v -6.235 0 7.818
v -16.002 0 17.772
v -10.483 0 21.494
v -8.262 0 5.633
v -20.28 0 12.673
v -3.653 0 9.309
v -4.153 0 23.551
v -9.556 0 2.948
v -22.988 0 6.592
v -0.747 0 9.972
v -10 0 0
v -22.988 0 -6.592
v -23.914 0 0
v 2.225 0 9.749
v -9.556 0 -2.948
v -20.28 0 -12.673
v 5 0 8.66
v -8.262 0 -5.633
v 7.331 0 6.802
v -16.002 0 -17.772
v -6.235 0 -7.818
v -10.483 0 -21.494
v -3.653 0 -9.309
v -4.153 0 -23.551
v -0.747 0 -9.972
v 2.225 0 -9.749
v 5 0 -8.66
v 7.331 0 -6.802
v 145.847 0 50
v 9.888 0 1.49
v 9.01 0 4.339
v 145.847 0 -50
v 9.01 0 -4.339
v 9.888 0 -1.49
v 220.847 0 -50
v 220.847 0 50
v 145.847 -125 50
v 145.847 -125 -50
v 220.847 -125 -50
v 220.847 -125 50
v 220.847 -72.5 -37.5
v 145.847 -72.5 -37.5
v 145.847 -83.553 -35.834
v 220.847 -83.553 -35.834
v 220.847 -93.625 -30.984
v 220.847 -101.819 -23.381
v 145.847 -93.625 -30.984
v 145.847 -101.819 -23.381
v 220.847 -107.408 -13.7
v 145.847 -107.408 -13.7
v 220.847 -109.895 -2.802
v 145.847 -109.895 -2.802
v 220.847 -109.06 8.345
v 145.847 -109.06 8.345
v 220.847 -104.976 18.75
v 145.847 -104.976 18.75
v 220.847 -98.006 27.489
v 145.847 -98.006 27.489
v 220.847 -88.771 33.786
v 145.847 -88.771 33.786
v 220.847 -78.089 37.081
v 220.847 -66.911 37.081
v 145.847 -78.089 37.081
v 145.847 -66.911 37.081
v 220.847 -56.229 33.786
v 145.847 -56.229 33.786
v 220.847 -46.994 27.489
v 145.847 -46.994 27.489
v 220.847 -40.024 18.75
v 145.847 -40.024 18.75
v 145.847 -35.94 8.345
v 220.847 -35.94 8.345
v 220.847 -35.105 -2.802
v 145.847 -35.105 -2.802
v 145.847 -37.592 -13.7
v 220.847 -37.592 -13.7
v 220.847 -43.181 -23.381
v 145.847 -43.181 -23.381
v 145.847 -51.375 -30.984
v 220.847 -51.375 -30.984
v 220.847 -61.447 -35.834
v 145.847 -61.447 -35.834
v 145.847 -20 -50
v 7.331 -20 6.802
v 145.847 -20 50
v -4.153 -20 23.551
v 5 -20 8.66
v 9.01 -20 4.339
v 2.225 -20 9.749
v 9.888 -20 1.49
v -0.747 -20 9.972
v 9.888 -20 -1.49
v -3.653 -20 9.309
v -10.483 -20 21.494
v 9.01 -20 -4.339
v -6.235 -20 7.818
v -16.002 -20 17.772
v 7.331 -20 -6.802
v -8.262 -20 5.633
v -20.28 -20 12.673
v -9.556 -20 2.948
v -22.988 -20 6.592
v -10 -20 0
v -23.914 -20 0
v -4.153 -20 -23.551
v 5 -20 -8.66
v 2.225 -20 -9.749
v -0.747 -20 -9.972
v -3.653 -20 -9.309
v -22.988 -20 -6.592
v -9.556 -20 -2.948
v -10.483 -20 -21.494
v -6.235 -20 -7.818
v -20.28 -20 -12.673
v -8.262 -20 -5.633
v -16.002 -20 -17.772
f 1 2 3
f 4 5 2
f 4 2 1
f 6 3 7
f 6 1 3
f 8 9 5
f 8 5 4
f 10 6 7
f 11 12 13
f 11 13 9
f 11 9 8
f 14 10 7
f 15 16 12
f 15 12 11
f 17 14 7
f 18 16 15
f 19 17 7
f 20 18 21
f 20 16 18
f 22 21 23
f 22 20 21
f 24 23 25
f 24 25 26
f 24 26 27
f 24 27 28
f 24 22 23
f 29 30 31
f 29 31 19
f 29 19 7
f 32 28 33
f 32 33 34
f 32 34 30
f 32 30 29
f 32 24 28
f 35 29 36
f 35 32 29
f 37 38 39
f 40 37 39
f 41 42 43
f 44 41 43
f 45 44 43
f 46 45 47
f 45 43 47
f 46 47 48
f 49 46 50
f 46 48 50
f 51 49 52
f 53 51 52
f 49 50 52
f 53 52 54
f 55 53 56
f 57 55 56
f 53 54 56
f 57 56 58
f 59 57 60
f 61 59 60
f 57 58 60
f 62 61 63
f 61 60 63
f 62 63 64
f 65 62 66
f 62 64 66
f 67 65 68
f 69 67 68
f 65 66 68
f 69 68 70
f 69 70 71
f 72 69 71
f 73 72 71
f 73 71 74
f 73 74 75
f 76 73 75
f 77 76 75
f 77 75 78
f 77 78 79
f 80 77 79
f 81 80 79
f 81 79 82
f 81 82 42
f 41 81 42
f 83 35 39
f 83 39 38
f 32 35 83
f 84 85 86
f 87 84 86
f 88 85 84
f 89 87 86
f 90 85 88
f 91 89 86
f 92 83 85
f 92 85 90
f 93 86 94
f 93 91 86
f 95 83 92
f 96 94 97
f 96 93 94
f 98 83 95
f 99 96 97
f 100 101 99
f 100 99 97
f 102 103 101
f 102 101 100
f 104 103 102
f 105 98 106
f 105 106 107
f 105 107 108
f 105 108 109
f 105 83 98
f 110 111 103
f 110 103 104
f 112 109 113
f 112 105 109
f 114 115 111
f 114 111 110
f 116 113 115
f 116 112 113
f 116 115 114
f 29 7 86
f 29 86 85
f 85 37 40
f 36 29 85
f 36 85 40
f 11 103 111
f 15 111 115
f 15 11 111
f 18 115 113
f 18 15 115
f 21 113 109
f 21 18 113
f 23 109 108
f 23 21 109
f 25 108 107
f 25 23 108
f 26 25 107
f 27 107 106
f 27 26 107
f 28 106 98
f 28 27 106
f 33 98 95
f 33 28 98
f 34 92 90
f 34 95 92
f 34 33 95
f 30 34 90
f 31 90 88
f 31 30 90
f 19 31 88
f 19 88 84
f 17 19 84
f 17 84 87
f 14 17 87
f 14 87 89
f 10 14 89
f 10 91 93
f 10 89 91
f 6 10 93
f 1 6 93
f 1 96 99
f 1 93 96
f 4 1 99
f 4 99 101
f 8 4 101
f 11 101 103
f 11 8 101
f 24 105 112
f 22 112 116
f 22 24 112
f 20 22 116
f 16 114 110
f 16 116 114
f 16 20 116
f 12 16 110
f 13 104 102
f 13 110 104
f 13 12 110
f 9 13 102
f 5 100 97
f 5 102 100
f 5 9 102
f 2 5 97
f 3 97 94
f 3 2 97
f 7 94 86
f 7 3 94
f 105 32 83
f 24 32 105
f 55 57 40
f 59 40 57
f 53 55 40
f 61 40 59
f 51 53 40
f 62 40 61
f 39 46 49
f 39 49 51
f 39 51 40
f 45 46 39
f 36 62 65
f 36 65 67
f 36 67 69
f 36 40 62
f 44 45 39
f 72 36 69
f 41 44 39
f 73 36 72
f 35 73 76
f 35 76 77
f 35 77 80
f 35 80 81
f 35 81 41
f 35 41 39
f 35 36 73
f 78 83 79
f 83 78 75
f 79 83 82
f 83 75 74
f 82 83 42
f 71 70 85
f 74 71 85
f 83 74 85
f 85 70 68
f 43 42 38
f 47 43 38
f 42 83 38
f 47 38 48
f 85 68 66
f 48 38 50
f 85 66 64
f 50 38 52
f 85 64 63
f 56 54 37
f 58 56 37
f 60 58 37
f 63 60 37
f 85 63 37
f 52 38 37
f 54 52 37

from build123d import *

# Parameters (mm, degrees)
SKETCH1_R           = 10
BOSS_EXTRUDE1_DEPTH = 125
CUT_EXTRUDE1_DEPTH  = 105
SKETCH5_R           = 37.5
CUT_EXTRUDE2_DEPTH  = 76


with BuildPart() as part:
    # Sketch1 → Boss-Extrude1 (new body)
    with BuildSketch(Plane(origin=(0, 0, 0), x_dir=(-1, 0, 0), z_dir=(0, -1, 0))):
        with BuildLine():
            Line((-220.847331583, 50), (-145.847331583, 50))
            Line((-145.847331583, 50), (4.152668417, 23.550952894))
            ThreePointArc((4.152668417, 23.550952894), (23.914264304, 0), (4.152668417, -23.550952894))
            Line((4.152668417, -23.550952894), (-145.847331583, -50))
            Line((-145.847331583, -50), (-220.847331583, -50))
            Line((-220.847331583, -50), (-220.847331583, 50))
        make_face()
        Circle(SKETCH1_R, mode=Mode.SUBTRACT)
    extrude(amount=BOSS_EXTRUDE1_DEPTH)

    # Sketch2 → Cut-Extrude1 (cut)
    with BuildSketch(Plane(origin=(0, -125, 0), x_dir=(-1, 0, 0), z_dir=(0, -1, 0))):
        with BuildLine():
            Line((-145.847331583, 50), (-145.847331583, -50))
            Line((-145.847331583, -50), (4.152668417, -23.550952894))
            ThreePointArc((4.152668417, -23.550952894), (23.914264304, 0), (4.152668417, 23.550952894))
            Line((4.152668417, 23.550952894), (-145.847331583, 50))
        make_face()
    extrude(amount=-CUT_EXTRUDE1_DEPTH, mode=Mode.SUBTRACT)

    # Sketch5 → Cut-Extrude2 (cut, through all)
    with BuildSketch(Plane(origin=(145.847331583, 0, 0), x_dir=(0, 0, -1), z_dir=(-1, 0, 0))):
        with Locations((0, 72.5)):
            Circle(SKETCH5_R)
    extrude(amount=-CUT_EXTRUDE2_DEPTH, mode=Mode.SUBTRACT)


solid = part.part
